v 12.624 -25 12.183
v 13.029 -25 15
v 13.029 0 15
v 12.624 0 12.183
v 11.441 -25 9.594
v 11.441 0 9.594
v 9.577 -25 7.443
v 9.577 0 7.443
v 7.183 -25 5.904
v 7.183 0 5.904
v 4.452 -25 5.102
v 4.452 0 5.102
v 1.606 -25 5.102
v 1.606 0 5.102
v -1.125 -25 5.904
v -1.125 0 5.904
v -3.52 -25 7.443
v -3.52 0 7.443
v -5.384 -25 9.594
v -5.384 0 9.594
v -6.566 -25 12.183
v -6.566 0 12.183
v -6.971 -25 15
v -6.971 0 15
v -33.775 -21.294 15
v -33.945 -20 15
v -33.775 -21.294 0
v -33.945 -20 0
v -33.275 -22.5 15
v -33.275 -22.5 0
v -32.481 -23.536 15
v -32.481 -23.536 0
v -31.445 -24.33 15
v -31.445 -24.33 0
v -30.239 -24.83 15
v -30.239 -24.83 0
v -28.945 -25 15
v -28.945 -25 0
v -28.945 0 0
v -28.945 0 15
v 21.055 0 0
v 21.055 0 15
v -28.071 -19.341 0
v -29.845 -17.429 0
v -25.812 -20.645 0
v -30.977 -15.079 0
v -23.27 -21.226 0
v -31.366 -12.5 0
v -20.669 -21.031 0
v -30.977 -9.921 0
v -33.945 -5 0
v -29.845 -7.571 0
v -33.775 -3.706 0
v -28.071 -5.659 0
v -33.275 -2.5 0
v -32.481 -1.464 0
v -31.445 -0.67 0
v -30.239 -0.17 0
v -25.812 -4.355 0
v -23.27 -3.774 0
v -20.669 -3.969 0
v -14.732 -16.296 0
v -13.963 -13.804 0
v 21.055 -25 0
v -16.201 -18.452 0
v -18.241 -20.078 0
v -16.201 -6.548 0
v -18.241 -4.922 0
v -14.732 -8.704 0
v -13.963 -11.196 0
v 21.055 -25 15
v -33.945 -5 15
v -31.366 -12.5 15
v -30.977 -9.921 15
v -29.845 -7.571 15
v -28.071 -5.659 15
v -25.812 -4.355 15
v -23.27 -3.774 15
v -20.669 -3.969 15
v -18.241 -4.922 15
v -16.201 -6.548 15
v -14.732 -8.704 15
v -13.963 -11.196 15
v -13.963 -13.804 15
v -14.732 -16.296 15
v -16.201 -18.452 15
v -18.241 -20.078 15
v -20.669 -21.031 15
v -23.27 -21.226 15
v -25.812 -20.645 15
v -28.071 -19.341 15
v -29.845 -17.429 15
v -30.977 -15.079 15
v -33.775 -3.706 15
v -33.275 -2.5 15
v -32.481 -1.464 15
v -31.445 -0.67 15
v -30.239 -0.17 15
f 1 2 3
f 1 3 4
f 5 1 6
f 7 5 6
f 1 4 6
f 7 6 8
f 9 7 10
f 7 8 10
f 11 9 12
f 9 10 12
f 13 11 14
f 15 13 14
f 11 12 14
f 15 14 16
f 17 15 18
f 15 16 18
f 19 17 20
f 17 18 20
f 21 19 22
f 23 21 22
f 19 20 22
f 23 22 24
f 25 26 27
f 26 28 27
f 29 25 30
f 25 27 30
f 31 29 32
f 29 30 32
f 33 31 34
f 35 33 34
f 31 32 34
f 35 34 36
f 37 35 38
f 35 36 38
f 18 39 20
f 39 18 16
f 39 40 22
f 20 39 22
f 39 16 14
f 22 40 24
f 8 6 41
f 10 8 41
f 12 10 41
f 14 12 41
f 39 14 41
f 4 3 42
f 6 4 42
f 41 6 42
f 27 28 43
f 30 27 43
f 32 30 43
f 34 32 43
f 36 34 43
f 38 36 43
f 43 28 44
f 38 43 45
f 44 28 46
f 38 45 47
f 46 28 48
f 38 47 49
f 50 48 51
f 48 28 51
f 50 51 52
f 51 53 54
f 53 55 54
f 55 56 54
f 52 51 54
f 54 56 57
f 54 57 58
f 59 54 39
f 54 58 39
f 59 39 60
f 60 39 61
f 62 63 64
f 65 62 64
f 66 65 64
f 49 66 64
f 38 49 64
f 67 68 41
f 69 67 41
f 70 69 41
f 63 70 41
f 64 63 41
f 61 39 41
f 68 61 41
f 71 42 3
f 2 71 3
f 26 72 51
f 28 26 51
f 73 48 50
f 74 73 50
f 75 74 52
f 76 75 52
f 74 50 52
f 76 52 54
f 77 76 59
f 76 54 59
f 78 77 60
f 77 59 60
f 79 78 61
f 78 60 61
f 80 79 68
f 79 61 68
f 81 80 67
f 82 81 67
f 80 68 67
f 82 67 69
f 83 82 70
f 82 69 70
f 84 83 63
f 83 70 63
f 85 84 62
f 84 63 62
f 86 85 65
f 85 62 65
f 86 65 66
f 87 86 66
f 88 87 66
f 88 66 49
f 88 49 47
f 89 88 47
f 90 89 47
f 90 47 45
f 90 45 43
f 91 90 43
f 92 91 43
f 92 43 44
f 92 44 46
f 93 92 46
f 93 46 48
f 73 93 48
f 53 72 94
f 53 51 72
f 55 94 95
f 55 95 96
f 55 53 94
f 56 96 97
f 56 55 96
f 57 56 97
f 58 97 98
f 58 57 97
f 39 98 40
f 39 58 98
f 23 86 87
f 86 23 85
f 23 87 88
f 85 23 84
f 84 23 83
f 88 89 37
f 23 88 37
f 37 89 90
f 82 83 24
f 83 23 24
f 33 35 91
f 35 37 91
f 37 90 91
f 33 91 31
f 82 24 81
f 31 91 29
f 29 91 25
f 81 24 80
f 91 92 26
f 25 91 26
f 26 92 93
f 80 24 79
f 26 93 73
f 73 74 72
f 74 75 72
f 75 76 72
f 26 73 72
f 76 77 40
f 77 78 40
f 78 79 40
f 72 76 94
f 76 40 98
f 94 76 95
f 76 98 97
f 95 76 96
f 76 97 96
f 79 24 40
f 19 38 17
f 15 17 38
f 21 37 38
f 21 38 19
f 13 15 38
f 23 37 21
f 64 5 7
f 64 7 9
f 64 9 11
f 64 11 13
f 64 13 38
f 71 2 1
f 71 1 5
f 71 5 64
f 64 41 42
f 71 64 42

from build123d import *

# Parameters (mm, degrees)
F1_DEPTH = 25
F2_R     = 5
F4_D     = 17.5


with BuildPart() as f1:
    # F0 (on Front) → F1 (new body)
    with BuildSketch(Plane.XZ):
        with BuildLine():
            Line((-33.945313, 0), (21.054687, 0))
            Line((21.054687, 0), (21.054687, 15))
            Line((21.054687, 15), (13.028848, 15))
            ThreePointArc((13.028848, 15), (3.028848, 5), (-6.971152, 15))
            Line((-6.971152, 15), (-33.945313, 15))
            Line((-33.945313, 15), (-33.945313, 0))
        make_face()
    extrude(amount=F1_DEPTH)

    # F2
    f2_edges = [f1.edges().sort_by_distance(p)[0] for p in [
        (-33.945313, -25, 7.5),
        (-33.945313, 0, 7.5),
    ]]
    fillet(f2_edges, radius=F2_R)

    # F4 (through all)
    with Locations(Plane.XY.offset(15)):
        with Locations((-22.615639, -12.5)):
            Hole(F4_D / 2)


solid = f1.part
